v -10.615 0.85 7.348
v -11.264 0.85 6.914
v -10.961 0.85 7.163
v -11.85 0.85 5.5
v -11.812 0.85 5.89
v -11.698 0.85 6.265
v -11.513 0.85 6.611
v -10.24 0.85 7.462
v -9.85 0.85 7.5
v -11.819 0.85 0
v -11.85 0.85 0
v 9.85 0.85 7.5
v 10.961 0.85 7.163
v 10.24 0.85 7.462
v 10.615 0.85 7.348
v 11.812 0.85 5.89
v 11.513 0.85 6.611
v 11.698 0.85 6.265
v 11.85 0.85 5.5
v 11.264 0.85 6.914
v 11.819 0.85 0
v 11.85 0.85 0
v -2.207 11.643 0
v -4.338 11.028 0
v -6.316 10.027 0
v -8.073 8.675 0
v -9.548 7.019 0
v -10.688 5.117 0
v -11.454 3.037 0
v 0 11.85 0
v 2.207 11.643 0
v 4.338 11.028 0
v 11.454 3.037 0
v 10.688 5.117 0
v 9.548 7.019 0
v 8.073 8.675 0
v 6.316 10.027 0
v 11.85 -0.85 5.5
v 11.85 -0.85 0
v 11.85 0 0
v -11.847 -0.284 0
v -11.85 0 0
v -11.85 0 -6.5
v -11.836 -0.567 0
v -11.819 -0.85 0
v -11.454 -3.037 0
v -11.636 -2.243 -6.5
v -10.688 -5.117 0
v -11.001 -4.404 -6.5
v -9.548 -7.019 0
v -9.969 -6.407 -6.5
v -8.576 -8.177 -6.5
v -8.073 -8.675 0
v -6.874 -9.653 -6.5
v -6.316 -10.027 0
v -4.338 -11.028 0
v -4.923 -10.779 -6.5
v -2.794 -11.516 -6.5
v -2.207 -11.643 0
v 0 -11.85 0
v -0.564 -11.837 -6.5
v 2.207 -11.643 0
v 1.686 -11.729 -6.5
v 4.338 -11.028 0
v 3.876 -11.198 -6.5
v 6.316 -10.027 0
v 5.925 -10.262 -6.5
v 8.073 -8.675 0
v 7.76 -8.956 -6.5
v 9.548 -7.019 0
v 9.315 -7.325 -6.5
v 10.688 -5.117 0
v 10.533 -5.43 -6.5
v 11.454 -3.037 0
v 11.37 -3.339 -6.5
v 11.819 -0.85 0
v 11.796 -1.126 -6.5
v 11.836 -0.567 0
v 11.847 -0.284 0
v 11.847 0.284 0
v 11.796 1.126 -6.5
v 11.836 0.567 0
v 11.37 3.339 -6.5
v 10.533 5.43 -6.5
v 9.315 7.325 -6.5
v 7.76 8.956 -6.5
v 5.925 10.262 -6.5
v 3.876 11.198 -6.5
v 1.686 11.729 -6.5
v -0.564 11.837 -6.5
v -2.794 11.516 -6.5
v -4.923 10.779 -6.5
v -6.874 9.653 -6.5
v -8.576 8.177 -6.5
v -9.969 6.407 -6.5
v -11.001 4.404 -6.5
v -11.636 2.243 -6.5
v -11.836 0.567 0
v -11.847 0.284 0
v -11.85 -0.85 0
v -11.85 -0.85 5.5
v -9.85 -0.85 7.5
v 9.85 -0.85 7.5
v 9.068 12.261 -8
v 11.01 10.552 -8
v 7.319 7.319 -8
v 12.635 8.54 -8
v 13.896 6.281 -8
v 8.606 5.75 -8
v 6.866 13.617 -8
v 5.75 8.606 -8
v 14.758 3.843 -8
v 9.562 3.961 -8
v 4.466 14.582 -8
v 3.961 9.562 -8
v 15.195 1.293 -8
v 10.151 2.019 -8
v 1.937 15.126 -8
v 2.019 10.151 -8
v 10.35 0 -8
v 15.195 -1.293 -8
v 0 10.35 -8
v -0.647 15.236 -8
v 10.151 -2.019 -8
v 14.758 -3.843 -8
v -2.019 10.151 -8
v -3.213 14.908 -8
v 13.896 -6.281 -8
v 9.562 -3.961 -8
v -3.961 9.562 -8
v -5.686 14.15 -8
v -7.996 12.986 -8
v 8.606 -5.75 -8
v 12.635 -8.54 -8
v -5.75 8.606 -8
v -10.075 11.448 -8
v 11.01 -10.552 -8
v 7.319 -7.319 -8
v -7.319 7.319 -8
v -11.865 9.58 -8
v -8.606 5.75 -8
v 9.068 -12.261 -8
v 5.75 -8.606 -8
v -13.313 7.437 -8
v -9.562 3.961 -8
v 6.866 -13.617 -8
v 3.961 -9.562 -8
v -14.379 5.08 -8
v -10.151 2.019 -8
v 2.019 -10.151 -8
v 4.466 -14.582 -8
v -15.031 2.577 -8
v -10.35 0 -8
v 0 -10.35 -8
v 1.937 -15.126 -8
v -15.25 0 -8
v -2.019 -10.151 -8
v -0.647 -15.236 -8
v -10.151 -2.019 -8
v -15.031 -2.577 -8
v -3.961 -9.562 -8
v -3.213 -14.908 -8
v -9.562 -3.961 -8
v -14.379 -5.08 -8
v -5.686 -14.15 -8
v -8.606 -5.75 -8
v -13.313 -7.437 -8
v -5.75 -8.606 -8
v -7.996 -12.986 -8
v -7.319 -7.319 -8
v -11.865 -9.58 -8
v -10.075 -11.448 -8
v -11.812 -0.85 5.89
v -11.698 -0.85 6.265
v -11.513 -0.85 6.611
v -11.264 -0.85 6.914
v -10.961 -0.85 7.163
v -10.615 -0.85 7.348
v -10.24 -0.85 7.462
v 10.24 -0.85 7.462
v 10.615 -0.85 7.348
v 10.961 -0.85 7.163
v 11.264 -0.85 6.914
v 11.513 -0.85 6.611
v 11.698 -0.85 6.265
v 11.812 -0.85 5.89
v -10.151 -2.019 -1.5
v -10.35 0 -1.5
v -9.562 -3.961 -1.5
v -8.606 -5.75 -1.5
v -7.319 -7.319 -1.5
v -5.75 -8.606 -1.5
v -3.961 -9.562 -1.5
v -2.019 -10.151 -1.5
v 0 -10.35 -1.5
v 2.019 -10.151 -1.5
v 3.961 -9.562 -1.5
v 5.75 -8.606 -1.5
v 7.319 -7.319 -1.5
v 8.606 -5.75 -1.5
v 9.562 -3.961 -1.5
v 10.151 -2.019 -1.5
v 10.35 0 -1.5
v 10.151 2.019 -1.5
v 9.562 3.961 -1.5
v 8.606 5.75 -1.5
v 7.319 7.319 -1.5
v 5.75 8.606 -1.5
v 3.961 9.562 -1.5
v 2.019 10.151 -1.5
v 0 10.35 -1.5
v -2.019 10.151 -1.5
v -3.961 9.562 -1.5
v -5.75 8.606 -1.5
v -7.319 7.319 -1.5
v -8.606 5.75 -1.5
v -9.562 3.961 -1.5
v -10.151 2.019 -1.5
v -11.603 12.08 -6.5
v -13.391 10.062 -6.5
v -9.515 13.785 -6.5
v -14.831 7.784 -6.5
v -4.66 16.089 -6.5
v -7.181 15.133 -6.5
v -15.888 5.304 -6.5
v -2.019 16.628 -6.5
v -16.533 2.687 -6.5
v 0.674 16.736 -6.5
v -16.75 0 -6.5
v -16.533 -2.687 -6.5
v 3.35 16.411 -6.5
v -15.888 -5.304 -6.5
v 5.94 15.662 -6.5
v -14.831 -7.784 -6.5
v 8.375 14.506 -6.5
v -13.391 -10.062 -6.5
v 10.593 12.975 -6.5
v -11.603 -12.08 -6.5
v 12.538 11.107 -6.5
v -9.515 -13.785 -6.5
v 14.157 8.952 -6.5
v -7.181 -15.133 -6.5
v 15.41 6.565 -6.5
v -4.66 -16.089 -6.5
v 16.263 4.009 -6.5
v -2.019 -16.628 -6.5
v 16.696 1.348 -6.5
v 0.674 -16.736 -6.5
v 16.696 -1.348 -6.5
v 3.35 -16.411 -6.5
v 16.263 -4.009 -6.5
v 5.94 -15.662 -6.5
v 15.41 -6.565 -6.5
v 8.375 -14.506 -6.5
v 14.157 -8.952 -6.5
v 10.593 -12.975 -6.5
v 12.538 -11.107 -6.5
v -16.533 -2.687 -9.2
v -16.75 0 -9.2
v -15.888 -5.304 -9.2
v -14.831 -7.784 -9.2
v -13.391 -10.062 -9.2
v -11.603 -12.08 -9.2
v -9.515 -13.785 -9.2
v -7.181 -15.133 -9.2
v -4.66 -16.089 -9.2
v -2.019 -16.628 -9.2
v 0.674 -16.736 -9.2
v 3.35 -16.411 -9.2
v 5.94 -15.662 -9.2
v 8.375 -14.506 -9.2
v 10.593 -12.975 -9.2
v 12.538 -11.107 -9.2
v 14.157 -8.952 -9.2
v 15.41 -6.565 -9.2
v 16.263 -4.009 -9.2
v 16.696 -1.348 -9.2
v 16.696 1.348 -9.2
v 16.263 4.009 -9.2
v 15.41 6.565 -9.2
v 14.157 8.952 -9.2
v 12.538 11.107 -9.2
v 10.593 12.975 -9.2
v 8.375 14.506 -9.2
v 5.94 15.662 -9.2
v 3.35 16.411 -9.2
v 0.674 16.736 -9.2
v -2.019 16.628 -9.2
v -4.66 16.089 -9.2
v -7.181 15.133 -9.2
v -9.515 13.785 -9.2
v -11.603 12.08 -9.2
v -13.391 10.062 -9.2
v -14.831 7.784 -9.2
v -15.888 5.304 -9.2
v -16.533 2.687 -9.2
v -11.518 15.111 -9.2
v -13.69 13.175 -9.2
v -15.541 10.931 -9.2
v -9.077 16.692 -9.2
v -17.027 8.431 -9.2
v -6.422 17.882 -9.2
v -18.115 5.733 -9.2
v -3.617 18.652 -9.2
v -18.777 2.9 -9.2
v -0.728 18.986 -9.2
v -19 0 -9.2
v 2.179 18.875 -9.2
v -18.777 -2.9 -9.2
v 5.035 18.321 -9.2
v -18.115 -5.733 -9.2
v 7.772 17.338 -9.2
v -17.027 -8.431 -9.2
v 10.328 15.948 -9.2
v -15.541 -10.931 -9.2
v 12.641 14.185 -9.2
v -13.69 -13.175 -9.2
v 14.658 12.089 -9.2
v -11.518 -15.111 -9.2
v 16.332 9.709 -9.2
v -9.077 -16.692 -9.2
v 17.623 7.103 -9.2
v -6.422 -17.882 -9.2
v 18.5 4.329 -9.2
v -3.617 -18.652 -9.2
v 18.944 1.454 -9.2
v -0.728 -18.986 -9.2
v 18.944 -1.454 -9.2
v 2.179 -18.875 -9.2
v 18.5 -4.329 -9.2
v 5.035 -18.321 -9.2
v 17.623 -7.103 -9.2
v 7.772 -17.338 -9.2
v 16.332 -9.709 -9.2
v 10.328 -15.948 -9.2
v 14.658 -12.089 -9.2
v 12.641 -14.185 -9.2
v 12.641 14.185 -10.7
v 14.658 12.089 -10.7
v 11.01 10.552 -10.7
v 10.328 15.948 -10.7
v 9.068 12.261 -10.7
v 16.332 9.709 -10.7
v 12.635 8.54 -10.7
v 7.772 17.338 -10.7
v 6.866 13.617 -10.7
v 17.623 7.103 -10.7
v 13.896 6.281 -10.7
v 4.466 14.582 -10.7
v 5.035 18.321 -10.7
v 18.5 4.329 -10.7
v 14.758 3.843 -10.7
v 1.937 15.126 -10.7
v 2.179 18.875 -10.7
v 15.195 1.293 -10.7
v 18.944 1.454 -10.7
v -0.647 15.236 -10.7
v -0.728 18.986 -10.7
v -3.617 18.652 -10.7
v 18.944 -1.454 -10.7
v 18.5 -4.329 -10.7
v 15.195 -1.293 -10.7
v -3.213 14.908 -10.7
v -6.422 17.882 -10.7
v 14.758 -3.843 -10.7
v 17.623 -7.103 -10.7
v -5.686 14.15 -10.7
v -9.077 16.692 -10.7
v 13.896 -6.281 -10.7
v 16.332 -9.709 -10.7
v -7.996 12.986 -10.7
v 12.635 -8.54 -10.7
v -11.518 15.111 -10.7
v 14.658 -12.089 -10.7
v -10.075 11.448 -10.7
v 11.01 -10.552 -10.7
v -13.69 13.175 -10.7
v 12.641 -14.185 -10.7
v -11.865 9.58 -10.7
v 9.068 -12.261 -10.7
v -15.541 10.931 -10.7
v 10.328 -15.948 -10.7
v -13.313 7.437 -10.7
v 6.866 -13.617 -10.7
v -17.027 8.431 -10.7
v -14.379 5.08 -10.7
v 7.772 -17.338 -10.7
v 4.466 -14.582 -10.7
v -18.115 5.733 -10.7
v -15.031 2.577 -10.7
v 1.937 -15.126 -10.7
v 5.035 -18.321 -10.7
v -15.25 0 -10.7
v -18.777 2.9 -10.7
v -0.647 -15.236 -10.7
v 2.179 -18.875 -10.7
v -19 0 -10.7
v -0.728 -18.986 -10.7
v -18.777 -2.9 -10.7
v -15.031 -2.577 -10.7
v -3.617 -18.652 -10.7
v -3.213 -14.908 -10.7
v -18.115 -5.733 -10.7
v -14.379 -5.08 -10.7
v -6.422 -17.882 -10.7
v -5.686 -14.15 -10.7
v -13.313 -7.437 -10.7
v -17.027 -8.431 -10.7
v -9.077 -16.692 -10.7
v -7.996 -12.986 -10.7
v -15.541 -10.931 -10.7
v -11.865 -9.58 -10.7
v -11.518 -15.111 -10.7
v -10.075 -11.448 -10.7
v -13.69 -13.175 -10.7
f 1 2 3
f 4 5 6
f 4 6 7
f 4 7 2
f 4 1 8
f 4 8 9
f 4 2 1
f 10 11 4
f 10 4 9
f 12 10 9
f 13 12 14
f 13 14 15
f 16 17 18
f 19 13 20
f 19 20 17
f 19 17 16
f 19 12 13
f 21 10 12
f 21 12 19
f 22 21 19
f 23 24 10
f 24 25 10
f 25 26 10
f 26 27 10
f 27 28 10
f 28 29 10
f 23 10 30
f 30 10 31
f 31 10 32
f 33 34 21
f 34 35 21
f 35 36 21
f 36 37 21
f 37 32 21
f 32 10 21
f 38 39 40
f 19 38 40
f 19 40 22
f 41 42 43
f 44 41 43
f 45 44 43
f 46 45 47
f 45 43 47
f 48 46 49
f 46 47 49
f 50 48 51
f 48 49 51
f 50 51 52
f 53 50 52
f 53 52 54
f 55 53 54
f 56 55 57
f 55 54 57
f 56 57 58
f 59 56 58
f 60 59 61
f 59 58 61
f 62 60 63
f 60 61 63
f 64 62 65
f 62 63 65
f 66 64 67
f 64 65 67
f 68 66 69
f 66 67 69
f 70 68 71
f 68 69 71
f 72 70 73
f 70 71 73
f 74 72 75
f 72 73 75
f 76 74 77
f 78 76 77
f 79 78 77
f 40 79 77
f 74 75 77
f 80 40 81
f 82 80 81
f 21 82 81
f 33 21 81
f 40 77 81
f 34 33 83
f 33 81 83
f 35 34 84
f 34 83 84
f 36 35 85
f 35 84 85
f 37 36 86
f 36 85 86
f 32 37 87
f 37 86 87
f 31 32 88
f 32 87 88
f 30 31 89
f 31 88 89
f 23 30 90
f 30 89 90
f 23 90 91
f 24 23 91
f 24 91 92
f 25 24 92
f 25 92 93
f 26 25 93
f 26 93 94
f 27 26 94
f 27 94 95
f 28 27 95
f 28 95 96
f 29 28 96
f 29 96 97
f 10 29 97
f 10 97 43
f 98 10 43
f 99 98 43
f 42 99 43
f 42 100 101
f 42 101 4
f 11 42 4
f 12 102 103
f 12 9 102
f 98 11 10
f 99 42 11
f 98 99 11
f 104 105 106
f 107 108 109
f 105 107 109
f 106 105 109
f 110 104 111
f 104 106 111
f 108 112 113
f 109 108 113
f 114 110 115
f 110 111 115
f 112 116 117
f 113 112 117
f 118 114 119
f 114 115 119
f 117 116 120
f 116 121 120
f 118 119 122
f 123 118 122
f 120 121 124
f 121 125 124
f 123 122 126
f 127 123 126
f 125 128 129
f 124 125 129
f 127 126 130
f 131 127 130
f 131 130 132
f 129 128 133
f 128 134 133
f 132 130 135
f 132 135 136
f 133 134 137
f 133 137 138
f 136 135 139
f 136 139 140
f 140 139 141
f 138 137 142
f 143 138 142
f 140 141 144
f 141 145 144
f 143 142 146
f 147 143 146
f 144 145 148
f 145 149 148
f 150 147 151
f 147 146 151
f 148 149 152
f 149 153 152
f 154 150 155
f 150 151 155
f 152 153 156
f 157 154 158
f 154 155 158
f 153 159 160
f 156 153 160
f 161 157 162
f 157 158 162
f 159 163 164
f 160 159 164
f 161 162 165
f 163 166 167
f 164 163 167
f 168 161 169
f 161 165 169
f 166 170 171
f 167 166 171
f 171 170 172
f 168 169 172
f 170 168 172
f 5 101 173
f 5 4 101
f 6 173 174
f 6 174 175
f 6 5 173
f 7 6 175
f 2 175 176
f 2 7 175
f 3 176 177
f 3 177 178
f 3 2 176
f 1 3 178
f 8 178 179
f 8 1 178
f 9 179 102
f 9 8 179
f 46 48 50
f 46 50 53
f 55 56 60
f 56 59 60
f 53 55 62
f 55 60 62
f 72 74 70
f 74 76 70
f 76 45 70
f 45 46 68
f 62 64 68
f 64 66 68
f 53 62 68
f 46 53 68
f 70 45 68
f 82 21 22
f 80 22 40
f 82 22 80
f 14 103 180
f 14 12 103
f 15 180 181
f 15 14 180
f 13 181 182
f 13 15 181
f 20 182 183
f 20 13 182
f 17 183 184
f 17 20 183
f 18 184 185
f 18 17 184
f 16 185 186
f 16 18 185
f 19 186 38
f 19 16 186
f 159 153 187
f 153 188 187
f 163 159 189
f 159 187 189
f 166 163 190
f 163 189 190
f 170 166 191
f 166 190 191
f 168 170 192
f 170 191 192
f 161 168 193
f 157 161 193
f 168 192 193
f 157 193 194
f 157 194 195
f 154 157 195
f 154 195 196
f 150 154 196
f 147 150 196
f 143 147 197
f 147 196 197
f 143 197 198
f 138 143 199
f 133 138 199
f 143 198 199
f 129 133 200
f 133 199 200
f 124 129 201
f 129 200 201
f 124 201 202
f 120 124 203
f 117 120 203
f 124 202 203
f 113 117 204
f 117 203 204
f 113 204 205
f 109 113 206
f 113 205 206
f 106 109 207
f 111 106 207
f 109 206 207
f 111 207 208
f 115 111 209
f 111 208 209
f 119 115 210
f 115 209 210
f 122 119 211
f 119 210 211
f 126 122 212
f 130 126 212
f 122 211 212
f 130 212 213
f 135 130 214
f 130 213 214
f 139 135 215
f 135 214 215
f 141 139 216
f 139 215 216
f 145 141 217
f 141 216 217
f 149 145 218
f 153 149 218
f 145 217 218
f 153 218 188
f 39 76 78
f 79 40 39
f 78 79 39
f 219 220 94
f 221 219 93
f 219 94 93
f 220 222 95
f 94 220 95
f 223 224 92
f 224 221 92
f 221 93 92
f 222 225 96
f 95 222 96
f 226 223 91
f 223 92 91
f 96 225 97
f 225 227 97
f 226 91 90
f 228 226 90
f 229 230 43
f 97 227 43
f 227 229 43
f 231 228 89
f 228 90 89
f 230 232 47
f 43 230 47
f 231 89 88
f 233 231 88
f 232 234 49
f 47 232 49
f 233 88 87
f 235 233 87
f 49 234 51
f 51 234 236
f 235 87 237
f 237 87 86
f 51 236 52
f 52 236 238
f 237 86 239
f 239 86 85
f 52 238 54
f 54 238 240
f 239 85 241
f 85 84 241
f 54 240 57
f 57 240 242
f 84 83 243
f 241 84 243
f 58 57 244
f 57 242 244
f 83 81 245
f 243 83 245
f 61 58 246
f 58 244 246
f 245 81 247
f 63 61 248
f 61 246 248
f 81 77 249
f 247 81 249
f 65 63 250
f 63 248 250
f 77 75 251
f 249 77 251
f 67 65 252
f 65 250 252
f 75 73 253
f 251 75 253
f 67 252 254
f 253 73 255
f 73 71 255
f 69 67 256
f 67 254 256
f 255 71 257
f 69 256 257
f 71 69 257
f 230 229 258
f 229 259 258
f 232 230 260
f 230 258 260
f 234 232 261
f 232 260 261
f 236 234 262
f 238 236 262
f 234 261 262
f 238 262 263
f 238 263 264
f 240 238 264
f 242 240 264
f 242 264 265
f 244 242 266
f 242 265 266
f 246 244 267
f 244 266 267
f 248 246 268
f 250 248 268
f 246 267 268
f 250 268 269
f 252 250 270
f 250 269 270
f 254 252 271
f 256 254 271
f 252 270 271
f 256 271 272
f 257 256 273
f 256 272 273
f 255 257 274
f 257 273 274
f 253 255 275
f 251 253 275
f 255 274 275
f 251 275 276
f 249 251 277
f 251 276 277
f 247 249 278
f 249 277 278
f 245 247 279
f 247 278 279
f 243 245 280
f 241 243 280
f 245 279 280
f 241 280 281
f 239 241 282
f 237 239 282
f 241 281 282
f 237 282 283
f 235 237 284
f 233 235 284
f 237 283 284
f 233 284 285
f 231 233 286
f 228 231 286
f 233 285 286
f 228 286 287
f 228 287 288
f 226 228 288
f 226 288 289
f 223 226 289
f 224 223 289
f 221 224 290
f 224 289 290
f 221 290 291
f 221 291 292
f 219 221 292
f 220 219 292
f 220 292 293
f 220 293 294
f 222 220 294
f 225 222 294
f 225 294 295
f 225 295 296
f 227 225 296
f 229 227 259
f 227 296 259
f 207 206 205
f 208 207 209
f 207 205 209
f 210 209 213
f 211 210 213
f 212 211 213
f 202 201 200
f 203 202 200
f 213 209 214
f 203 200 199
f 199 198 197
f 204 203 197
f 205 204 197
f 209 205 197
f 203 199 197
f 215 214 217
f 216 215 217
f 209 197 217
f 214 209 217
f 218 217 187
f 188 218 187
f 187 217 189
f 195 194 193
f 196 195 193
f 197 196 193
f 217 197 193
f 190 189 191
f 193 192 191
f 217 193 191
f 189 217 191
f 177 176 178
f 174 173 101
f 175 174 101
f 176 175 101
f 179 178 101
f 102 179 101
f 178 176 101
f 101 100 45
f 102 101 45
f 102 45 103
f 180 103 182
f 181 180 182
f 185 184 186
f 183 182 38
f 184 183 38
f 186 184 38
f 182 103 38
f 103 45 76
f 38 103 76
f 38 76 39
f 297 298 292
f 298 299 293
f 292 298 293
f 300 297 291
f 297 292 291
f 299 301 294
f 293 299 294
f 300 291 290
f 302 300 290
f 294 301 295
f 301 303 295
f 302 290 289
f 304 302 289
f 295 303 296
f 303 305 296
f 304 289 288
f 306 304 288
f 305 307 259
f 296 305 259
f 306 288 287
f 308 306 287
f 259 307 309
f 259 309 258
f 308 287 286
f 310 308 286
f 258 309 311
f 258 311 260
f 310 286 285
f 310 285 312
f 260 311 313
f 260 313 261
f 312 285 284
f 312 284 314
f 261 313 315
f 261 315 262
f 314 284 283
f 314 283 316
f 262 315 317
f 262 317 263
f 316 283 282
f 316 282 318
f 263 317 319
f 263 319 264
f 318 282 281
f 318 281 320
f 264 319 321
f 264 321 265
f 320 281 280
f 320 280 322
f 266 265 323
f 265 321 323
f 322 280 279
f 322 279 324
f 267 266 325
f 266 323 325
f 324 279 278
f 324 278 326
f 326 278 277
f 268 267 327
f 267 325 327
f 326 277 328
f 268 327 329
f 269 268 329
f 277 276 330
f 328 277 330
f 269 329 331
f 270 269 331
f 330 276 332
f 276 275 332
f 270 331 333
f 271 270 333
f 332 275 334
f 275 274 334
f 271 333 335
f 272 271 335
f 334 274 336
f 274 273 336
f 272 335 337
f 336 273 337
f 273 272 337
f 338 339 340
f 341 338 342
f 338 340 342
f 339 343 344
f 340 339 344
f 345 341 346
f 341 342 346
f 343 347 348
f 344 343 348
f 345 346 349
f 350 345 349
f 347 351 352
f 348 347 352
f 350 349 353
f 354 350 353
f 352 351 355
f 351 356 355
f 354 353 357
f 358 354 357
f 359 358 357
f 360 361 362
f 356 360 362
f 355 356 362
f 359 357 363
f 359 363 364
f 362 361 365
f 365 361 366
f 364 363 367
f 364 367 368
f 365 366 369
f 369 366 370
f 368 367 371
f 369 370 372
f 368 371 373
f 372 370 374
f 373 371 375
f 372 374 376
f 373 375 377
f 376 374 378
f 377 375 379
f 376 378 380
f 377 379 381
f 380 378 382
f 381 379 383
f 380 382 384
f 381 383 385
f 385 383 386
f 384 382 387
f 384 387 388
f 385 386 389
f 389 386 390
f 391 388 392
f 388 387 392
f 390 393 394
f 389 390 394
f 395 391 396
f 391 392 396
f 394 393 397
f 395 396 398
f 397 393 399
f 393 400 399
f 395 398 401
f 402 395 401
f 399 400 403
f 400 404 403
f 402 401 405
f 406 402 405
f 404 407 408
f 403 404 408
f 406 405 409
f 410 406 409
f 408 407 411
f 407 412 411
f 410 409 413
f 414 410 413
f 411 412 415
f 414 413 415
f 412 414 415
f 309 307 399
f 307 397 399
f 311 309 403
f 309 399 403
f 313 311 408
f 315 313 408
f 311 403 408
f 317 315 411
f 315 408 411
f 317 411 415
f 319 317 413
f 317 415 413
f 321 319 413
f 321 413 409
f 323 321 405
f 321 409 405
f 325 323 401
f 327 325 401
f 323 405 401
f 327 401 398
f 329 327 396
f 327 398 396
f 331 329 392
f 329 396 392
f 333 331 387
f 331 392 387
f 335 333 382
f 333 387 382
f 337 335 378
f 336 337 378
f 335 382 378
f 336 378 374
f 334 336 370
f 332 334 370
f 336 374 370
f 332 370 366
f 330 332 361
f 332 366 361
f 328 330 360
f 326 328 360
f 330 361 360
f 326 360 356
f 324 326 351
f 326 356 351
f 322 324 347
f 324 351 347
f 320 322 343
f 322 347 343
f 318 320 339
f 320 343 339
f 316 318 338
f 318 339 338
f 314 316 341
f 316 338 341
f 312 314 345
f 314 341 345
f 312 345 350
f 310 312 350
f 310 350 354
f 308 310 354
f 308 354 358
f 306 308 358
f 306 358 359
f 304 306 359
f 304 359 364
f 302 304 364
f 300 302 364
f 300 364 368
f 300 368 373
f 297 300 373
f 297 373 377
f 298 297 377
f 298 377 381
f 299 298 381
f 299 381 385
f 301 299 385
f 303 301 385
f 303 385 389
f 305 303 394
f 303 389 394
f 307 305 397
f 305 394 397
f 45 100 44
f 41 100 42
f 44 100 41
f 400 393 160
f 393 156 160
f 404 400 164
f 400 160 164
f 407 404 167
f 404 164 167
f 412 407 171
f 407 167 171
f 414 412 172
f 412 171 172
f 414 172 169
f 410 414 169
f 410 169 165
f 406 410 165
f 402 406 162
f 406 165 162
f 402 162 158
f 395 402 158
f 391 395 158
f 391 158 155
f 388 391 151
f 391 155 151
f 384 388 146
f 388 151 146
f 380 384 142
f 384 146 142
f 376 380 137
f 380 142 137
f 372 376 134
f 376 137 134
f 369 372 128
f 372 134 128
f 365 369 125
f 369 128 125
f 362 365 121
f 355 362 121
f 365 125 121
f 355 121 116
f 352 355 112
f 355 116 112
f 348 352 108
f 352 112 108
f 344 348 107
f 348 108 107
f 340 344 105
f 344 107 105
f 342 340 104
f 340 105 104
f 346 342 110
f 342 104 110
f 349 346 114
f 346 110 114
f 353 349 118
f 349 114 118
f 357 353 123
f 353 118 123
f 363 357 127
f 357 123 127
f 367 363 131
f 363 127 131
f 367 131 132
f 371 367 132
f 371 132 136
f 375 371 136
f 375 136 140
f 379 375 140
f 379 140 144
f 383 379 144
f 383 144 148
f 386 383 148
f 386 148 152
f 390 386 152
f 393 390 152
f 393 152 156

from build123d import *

# Parameters (mm, degrees)
F2_W     = 23.7
F2_H     = 1.7
F3_DEPTH = 7.5
F4_R     = 2
F5_R     = 2


with BuildPart() as f1:
    # F0 (on Front) → F1 (revolve)
    with BuildSketch(Plane.XZ):
        Polygon((0, -1.5), (0, 0), (-11.85, 0), (-11.85, -6.5), (-16.75, -6.5), (-16.75, -9.2), (-19, -9.2), (-19, -10.7), (-15.25, -10.7), (-15.25, -8), (-10.35, -8), (-10.35, -1.5), align=None)
    revolve(axis=Axis((0, 0, -0.75), (0, 0, 1)))

    # F2 (on Top) → F3 (join)
    with BuildSketch(Plane.XY):
        Rectangle(F2_W, F2_H)
    extrude(amount=F3_DEPTH)

    # F4
    f4_edges = [f1.edges().sort_by_distance(p)[0] for p in [
        (-11.85, 0, 7.5),
    ]]
    fillet(f4_edges, radius=F4_R)

    # F5
    f5_edges = [f1.edges().sort_by_distance(p)[0] for p in [
        (11.85, 0, 7.5),
    ]]
    fillet(f5_edges, radius=F5_R)


solid = f1.part
